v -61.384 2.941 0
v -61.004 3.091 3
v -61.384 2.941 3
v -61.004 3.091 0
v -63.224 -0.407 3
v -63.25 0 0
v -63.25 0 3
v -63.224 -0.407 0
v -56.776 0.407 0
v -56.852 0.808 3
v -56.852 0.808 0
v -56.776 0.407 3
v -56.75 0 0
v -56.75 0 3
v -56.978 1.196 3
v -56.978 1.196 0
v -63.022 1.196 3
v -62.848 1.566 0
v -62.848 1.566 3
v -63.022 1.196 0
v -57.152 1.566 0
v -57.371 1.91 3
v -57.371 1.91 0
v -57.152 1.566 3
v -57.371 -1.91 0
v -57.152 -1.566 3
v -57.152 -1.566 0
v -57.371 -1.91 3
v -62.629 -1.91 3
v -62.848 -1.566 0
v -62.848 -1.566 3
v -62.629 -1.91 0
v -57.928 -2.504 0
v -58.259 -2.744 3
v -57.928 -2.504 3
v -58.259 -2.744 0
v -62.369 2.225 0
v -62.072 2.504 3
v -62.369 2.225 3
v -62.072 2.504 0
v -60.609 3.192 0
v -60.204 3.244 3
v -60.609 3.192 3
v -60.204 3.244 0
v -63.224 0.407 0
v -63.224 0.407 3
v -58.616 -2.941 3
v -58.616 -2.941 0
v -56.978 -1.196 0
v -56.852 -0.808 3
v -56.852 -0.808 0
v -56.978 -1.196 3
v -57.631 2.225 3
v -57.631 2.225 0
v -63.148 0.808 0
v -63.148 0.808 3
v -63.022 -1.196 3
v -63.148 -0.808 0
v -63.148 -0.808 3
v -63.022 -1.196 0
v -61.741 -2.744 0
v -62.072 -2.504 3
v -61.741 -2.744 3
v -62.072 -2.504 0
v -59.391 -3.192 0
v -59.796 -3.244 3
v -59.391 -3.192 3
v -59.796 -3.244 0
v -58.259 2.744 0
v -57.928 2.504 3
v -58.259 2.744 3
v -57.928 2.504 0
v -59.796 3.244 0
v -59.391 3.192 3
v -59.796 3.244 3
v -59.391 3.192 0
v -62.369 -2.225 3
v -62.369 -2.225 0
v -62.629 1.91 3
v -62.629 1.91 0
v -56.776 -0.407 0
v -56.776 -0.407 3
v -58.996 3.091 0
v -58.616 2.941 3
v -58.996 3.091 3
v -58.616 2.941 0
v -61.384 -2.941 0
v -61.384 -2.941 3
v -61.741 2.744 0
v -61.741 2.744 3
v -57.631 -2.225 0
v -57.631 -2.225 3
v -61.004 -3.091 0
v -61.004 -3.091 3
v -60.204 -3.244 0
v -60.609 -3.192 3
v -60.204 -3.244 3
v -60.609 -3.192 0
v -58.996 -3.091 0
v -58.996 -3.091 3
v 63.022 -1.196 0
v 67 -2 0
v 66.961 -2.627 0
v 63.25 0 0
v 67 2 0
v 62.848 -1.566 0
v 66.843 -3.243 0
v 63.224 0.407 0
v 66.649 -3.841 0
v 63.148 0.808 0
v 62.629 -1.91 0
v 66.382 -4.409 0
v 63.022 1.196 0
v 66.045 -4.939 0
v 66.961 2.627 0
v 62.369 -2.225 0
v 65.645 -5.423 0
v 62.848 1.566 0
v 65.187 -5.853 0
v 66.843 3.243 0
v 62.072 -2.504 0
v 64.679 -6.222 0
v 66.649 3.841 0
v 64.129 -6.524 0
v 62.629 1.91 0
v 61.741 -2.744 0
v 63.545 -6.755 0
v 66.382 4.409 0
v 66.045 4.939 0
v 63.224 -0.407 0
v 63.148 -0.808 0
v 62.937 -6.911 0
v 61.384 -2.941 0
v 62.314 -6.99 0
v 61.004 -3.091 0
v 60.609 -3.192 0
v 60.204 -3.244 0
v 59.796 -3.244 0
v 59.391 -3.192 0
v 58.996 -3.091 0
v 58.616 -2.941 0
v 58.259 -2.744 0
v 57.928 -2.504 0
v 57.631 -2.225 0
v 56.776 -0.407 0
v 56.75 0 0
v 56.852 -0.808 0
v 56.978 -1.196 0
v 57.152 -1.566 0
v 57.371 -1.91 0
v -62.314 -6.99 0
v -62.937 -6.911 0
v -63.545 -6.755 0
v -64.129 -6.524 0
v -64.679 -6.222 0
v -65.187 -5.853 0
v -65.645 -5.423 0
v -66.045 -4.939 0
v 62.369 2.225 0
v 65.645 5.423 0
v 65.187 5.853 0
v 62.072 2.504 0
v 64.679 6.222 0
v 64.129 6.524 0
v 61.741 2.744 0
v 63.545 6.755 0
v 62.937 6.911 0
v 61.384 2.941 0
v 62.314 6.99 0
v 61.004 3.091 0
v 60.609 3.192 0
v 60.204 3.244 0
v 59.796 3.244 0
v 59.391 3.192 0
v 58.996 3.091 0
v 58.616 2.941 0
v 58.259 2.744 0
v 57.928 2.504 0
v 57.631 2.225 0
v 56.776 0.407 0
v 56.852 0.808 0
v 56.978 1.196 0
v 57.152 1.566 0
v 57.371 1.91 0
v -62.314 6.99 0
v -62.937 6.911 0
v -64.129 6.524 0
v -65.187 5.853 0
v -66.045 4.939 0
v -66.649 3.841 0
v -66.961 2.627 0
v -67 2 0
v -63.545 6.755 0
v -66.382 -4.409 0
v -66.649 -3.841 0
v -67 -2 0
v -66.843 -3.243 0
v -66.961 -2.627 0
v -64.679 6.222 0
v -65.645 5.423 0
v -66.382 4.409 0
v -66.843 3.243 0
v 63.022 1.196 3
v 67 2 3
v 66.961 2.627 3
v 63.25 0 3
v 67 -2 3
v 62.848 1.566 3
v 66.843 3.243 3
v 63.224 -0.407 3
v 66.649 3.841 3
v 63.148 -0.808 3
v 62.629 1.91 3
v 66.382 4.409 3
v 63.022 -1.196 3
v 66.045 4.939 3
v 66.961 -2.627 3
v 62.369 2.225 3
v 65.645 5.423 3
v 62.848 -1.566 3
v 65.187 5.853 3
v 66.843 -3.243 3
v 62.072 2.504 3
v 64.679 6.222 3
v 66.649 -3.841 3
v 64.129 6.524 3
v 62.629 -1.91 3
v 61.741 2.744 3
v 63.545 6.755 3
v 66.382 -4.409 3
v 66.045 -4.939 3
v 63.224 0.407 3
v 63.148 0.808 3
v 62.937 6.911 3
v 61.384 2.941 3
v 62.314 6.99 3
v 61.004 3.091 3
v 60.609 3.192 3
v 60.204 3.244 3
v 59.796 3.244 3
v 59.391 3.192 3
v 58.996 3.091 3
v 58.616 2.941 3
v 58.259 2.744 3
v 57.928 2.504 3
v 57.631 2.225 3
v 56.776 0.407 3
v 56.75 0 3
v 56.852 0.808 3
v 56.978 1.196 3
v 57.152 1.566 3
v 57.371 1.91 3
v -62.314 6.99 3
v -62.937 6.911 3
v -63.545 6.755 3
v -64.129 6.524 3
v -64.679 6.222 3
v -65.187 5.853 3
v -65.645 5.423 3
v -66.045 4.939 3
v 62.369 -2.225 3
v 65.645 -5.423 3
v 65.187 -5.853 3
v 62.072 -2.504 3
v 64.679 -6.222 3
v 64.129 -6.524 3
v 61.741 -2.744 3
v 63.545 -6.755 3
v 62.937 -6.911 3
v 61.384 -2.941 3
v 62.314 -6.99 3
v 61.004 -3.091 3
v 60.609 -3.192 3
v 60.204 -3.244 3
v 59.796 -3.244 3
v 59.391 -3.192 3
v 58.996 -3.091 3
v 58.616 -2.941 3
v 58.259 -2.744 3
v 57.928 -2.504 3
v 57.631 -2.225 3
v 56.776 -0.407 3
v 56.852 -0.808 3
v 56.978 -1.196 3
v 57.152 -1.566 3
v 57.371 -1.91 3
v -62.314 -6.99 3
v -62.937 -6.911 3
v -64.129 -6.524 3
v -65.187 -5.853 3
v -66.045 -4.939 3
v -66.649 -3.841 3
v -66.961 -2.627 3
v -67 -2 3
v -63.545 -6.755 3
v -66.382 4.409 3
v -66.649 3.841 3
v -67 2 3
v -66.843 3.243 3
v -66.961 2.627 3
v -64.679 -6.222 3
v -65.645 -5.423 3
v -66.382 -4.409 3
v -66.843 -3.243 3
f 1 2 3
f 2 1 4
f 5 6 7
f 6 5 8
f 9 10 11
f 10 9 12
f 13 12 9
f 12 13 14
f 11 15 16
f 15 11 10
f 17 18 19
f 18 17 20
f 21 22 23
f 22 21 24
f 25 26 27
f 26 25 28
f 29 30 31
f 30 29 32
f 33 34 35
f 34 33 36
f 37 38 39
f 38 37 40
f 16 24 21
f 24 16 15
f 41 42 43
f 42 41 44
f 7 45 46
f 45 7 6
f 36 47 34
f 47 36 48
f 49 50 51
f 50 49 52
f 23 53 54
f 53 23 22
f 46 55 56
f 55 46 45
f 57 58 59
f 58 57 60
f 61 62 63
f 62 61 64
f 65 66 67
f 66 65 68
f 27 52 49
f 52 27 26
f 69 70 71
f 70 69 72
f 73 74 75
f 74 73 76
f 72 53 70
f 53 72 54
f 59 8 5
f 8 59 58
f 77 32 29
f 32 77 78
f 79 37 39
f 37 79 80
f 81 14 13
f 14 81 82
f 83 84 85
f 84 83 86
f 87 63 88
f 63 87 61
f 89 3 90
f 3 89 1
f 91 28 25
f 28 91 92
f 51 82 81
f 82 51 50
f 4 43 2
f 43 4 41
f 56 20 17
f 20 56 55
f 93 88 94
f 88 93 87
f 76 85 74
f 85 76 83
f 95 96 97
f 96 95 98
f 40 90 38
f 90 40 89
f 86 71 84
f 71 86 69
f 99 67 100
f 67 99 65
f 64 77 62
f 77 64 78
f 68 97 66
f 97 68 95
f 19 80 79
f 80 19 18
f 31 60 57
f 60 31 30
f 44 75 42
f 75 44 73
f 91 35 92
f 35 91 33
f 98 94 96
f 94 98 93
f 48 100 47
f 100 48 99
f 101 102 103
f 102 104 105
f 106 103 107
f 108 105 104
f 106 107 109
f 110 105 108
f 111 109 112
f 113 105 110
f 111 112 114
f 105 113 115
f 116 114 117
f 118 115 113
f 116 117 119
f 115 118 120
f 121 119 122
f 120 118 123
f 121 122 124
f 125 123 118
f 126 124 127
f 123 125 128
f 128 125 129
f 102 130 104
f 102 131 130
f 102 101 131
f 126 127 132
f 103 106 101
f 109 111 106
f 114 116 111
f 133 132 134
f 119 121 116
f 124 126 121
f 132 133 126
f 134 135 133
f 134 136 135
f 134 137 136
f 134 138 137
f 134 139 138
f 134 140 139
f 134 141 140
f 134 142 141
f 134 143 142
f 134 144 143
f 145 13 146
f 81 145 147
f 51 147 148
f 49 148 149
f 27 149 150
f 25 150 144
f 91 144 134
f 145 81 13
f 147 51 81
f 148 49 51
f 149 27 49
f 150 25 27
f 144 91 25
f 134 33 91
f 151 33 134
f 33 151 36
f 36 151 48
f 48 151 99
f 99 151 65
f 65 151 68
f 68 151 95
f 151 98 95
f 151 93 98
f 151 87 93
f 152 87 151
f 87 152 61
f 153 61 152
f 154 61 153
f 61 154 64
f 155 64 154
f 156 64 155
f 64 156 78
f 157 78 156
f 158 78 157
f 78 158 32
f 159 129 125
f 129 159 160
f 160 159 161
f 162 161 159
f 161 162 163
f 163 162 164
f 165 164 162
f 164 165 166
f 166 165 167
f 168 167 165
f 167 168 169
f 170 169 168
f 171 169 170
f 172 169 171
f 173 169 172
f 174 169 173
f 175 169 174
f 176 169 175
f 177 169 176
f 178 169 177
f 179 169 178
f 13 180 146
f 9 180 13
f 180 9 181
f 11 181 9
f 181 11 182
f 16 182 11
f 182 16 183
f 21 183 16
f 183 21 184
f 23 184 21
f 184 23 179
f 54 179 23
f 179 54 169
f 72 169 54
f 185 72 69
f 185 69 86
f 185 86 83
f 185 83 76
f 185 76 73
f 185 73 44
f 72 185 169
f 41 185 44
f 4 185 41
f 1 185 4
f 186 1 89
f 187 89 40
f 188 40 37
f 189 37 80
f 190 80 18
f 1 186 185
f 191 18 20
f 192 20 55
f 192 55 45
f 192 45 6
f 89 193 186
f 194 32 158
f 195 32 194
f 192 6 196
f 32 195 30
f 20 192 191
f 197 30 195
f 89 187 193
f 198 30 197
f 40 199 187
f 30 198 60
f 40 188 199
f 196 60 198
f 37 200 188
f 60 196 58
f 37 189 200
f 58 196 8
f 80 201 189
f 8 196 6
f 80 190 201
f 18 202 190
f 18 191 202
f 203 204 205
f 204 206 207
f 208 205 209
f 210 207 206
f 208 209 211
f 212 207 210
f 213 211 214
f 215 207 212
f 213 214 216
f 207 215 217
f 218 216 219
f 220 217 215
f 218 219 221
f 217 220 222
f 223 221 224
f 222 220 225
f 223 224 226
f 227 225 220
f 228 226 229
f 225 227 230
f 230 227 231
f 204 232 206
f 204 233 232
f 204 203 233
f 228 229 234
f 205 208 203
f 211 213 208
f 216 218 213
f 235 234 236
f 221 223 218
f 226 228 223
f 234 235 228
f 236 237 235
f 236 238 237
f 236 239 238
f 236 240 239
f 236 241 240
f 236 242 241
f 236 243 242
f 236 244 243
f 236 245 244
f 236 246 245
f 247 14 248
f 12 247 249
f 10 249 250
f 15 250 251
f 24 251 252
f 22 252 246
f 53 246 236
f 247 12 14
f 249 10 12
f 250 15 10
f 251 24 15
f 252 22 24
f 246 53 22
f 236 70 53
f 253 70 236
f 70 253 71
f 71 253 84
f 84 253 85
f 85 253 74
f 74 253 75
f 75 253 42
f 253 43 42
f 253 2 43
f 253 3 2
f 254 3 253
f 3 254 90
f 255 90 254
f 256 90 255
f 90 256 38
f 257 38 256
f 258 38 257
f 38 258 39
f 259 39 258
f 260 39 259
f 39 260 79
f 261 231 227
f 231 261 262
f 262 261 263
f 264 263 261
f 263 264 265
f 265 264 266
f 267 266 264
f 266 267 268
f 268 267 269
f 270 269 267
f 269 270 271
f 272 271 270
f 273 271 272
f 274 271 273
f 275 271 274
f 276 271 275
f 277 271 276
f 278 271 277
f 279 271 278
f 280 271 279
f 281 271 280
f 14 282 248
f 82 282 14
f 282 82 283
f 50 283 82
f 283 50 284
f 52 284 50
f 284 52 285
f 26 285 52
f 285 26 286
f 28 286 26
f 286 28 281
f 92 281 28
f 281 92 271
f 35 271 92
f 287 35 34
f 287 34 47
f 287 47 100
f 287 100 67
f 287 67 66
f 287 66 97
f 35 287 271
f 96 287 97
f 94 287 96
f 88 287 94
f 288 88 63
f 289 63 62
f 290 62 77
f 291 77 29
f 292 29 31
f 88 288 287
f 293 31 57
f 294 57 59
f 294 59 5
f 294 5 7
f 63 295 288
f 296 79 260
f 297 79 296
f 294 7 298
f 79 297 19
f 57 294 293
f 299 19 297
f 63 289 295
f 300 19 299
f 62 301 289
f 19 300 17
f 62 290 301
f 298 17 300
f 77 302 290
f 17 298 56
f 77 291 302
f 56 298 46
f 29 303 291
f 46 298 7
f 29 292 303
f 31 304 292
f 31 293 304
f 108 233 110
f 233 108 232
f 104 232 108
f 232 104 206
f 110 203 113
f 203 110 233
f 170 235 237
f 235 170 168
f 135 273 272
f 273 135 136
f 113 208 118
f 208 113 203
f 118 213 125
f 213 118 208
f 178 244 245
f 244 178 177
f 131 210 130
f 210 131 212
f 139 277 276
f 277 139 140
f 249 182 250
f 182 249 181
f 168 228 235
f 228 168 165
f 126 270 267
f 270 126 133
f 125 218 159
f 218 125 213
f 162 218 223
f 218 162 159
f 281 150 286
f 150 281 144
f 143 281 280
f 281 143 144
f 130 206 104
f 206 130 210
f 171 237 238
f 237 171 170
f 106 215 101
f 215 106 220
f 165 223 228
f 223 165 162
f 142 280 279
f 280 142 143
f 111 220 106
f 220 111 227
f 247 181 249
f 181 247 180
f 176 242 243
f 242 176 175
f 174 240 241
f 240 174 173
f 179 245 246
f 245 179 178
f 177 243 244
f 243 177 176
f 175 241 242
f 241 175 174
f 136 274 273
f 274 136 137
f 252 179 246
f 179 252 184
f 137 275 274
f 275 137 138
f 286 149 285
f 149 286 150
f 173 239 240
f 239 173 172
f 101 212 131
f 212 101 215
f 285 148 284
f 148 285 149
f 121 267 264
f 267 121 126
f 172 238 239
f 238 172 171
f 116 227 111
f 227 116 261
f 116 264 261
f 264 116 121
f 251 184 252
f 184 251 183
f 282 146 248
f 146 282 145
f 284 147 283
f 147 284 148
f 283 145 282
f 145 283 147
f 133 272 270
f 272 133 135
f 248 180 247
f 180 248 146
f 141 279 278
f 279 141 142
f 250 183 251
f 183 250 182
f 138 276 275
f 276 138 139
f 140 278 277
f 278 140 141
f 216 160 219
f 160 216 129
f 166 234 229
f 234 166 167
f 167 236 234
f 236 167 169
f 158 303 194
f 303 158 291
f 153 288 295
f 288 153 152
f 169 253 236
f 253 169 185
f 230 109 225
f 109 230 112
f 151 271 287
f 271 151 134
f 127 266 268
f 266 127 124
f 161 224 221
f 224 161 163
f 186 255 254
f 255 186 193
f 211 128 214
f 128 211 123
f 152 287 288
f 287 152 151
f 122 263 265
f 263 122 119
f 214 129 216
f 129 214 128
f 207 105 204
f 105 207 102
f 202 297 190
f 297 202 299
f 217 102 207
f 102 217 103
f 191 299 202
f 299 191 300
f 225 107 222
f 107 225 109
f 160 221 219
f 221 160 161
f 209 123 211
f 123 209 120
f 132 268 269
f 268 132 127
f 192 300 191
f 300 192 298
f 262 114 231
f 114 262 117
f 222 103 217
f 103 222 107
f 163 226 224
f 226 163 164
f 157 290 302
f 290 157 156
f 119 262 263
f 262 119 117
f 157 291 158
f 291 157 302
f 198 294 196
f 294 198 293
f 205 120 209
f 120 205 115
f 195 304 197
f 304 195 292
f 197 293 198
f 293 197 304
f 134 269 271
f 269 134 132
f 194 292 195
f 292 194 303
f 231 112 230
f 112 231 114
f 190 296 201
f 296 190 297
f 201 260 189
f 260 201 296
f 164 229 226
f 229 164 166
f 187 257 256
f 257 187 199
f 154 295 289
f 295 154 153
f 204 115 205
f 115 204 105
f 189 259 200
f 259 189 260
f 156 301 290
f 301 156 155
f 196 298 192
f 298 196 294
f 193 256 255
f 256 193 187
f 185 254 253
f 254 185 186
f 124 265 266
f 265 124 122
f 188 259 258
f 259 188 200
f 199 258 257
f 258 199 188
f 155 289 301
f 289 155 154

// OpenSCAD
$fn = 50;


difference() {
	union() {
		hull() {
			translate(v = [-62.0000000000, 2.0000000000, 0]) {
				cylinder(h = 3, r = 5);
			}
			translate(v = [62.0000000000, 2.0000000000, 0]) {
				cylinder(h = 3, r = 5);
			}
			translate(v = [-62.0000000000, -2.0000000000, 0]) {
				cylinder(h = 3, r = 5);
			}
			translate(v = [62.0000000000, -2.0000000000, 0]) {
				cylinder(h = 3, r = 5);
			}
		}
	}
	union() {
		translate(v = [-60.0000000000, 0.0000000000, 0]) {
			cylinder(h = 3, r = 3.2500000000);
		}
		translate(v = [60.0000000000, 0.0000000000, 0]) {
			cylinder(h = 3, r = 3.2500000000);
		}
		translate(v = [-60.0000000000, 0.0000000000, 0]) {
			cylinder(h = 3, r = 1.8000000000);
		}
		translate(v = [60.0000000000, 0.0000000000, 0]) {
			cylinder(h = 3, r = 1.8000000000);
		}
		translate(v = [-60.0000000000, 0.0000000000, 0]) {
			cylinder(h = 3, r = 1.8000000000);
		}
		translate(v = [60.0000000000, 0.0000000000, 0]) {
			cylinder(h = 3, r = 1.8000000000);
		}
		translate(v = [-60.0000000000, 0.0000000000, 0]) {
			cylinder(h = 3, r = 1.8000000000);
		}
		translate(v = [60.0000000000, 0.0000000000, 0]) {
			cylinder(h = 3, r = 1.8000000000);
		}
	}
}
